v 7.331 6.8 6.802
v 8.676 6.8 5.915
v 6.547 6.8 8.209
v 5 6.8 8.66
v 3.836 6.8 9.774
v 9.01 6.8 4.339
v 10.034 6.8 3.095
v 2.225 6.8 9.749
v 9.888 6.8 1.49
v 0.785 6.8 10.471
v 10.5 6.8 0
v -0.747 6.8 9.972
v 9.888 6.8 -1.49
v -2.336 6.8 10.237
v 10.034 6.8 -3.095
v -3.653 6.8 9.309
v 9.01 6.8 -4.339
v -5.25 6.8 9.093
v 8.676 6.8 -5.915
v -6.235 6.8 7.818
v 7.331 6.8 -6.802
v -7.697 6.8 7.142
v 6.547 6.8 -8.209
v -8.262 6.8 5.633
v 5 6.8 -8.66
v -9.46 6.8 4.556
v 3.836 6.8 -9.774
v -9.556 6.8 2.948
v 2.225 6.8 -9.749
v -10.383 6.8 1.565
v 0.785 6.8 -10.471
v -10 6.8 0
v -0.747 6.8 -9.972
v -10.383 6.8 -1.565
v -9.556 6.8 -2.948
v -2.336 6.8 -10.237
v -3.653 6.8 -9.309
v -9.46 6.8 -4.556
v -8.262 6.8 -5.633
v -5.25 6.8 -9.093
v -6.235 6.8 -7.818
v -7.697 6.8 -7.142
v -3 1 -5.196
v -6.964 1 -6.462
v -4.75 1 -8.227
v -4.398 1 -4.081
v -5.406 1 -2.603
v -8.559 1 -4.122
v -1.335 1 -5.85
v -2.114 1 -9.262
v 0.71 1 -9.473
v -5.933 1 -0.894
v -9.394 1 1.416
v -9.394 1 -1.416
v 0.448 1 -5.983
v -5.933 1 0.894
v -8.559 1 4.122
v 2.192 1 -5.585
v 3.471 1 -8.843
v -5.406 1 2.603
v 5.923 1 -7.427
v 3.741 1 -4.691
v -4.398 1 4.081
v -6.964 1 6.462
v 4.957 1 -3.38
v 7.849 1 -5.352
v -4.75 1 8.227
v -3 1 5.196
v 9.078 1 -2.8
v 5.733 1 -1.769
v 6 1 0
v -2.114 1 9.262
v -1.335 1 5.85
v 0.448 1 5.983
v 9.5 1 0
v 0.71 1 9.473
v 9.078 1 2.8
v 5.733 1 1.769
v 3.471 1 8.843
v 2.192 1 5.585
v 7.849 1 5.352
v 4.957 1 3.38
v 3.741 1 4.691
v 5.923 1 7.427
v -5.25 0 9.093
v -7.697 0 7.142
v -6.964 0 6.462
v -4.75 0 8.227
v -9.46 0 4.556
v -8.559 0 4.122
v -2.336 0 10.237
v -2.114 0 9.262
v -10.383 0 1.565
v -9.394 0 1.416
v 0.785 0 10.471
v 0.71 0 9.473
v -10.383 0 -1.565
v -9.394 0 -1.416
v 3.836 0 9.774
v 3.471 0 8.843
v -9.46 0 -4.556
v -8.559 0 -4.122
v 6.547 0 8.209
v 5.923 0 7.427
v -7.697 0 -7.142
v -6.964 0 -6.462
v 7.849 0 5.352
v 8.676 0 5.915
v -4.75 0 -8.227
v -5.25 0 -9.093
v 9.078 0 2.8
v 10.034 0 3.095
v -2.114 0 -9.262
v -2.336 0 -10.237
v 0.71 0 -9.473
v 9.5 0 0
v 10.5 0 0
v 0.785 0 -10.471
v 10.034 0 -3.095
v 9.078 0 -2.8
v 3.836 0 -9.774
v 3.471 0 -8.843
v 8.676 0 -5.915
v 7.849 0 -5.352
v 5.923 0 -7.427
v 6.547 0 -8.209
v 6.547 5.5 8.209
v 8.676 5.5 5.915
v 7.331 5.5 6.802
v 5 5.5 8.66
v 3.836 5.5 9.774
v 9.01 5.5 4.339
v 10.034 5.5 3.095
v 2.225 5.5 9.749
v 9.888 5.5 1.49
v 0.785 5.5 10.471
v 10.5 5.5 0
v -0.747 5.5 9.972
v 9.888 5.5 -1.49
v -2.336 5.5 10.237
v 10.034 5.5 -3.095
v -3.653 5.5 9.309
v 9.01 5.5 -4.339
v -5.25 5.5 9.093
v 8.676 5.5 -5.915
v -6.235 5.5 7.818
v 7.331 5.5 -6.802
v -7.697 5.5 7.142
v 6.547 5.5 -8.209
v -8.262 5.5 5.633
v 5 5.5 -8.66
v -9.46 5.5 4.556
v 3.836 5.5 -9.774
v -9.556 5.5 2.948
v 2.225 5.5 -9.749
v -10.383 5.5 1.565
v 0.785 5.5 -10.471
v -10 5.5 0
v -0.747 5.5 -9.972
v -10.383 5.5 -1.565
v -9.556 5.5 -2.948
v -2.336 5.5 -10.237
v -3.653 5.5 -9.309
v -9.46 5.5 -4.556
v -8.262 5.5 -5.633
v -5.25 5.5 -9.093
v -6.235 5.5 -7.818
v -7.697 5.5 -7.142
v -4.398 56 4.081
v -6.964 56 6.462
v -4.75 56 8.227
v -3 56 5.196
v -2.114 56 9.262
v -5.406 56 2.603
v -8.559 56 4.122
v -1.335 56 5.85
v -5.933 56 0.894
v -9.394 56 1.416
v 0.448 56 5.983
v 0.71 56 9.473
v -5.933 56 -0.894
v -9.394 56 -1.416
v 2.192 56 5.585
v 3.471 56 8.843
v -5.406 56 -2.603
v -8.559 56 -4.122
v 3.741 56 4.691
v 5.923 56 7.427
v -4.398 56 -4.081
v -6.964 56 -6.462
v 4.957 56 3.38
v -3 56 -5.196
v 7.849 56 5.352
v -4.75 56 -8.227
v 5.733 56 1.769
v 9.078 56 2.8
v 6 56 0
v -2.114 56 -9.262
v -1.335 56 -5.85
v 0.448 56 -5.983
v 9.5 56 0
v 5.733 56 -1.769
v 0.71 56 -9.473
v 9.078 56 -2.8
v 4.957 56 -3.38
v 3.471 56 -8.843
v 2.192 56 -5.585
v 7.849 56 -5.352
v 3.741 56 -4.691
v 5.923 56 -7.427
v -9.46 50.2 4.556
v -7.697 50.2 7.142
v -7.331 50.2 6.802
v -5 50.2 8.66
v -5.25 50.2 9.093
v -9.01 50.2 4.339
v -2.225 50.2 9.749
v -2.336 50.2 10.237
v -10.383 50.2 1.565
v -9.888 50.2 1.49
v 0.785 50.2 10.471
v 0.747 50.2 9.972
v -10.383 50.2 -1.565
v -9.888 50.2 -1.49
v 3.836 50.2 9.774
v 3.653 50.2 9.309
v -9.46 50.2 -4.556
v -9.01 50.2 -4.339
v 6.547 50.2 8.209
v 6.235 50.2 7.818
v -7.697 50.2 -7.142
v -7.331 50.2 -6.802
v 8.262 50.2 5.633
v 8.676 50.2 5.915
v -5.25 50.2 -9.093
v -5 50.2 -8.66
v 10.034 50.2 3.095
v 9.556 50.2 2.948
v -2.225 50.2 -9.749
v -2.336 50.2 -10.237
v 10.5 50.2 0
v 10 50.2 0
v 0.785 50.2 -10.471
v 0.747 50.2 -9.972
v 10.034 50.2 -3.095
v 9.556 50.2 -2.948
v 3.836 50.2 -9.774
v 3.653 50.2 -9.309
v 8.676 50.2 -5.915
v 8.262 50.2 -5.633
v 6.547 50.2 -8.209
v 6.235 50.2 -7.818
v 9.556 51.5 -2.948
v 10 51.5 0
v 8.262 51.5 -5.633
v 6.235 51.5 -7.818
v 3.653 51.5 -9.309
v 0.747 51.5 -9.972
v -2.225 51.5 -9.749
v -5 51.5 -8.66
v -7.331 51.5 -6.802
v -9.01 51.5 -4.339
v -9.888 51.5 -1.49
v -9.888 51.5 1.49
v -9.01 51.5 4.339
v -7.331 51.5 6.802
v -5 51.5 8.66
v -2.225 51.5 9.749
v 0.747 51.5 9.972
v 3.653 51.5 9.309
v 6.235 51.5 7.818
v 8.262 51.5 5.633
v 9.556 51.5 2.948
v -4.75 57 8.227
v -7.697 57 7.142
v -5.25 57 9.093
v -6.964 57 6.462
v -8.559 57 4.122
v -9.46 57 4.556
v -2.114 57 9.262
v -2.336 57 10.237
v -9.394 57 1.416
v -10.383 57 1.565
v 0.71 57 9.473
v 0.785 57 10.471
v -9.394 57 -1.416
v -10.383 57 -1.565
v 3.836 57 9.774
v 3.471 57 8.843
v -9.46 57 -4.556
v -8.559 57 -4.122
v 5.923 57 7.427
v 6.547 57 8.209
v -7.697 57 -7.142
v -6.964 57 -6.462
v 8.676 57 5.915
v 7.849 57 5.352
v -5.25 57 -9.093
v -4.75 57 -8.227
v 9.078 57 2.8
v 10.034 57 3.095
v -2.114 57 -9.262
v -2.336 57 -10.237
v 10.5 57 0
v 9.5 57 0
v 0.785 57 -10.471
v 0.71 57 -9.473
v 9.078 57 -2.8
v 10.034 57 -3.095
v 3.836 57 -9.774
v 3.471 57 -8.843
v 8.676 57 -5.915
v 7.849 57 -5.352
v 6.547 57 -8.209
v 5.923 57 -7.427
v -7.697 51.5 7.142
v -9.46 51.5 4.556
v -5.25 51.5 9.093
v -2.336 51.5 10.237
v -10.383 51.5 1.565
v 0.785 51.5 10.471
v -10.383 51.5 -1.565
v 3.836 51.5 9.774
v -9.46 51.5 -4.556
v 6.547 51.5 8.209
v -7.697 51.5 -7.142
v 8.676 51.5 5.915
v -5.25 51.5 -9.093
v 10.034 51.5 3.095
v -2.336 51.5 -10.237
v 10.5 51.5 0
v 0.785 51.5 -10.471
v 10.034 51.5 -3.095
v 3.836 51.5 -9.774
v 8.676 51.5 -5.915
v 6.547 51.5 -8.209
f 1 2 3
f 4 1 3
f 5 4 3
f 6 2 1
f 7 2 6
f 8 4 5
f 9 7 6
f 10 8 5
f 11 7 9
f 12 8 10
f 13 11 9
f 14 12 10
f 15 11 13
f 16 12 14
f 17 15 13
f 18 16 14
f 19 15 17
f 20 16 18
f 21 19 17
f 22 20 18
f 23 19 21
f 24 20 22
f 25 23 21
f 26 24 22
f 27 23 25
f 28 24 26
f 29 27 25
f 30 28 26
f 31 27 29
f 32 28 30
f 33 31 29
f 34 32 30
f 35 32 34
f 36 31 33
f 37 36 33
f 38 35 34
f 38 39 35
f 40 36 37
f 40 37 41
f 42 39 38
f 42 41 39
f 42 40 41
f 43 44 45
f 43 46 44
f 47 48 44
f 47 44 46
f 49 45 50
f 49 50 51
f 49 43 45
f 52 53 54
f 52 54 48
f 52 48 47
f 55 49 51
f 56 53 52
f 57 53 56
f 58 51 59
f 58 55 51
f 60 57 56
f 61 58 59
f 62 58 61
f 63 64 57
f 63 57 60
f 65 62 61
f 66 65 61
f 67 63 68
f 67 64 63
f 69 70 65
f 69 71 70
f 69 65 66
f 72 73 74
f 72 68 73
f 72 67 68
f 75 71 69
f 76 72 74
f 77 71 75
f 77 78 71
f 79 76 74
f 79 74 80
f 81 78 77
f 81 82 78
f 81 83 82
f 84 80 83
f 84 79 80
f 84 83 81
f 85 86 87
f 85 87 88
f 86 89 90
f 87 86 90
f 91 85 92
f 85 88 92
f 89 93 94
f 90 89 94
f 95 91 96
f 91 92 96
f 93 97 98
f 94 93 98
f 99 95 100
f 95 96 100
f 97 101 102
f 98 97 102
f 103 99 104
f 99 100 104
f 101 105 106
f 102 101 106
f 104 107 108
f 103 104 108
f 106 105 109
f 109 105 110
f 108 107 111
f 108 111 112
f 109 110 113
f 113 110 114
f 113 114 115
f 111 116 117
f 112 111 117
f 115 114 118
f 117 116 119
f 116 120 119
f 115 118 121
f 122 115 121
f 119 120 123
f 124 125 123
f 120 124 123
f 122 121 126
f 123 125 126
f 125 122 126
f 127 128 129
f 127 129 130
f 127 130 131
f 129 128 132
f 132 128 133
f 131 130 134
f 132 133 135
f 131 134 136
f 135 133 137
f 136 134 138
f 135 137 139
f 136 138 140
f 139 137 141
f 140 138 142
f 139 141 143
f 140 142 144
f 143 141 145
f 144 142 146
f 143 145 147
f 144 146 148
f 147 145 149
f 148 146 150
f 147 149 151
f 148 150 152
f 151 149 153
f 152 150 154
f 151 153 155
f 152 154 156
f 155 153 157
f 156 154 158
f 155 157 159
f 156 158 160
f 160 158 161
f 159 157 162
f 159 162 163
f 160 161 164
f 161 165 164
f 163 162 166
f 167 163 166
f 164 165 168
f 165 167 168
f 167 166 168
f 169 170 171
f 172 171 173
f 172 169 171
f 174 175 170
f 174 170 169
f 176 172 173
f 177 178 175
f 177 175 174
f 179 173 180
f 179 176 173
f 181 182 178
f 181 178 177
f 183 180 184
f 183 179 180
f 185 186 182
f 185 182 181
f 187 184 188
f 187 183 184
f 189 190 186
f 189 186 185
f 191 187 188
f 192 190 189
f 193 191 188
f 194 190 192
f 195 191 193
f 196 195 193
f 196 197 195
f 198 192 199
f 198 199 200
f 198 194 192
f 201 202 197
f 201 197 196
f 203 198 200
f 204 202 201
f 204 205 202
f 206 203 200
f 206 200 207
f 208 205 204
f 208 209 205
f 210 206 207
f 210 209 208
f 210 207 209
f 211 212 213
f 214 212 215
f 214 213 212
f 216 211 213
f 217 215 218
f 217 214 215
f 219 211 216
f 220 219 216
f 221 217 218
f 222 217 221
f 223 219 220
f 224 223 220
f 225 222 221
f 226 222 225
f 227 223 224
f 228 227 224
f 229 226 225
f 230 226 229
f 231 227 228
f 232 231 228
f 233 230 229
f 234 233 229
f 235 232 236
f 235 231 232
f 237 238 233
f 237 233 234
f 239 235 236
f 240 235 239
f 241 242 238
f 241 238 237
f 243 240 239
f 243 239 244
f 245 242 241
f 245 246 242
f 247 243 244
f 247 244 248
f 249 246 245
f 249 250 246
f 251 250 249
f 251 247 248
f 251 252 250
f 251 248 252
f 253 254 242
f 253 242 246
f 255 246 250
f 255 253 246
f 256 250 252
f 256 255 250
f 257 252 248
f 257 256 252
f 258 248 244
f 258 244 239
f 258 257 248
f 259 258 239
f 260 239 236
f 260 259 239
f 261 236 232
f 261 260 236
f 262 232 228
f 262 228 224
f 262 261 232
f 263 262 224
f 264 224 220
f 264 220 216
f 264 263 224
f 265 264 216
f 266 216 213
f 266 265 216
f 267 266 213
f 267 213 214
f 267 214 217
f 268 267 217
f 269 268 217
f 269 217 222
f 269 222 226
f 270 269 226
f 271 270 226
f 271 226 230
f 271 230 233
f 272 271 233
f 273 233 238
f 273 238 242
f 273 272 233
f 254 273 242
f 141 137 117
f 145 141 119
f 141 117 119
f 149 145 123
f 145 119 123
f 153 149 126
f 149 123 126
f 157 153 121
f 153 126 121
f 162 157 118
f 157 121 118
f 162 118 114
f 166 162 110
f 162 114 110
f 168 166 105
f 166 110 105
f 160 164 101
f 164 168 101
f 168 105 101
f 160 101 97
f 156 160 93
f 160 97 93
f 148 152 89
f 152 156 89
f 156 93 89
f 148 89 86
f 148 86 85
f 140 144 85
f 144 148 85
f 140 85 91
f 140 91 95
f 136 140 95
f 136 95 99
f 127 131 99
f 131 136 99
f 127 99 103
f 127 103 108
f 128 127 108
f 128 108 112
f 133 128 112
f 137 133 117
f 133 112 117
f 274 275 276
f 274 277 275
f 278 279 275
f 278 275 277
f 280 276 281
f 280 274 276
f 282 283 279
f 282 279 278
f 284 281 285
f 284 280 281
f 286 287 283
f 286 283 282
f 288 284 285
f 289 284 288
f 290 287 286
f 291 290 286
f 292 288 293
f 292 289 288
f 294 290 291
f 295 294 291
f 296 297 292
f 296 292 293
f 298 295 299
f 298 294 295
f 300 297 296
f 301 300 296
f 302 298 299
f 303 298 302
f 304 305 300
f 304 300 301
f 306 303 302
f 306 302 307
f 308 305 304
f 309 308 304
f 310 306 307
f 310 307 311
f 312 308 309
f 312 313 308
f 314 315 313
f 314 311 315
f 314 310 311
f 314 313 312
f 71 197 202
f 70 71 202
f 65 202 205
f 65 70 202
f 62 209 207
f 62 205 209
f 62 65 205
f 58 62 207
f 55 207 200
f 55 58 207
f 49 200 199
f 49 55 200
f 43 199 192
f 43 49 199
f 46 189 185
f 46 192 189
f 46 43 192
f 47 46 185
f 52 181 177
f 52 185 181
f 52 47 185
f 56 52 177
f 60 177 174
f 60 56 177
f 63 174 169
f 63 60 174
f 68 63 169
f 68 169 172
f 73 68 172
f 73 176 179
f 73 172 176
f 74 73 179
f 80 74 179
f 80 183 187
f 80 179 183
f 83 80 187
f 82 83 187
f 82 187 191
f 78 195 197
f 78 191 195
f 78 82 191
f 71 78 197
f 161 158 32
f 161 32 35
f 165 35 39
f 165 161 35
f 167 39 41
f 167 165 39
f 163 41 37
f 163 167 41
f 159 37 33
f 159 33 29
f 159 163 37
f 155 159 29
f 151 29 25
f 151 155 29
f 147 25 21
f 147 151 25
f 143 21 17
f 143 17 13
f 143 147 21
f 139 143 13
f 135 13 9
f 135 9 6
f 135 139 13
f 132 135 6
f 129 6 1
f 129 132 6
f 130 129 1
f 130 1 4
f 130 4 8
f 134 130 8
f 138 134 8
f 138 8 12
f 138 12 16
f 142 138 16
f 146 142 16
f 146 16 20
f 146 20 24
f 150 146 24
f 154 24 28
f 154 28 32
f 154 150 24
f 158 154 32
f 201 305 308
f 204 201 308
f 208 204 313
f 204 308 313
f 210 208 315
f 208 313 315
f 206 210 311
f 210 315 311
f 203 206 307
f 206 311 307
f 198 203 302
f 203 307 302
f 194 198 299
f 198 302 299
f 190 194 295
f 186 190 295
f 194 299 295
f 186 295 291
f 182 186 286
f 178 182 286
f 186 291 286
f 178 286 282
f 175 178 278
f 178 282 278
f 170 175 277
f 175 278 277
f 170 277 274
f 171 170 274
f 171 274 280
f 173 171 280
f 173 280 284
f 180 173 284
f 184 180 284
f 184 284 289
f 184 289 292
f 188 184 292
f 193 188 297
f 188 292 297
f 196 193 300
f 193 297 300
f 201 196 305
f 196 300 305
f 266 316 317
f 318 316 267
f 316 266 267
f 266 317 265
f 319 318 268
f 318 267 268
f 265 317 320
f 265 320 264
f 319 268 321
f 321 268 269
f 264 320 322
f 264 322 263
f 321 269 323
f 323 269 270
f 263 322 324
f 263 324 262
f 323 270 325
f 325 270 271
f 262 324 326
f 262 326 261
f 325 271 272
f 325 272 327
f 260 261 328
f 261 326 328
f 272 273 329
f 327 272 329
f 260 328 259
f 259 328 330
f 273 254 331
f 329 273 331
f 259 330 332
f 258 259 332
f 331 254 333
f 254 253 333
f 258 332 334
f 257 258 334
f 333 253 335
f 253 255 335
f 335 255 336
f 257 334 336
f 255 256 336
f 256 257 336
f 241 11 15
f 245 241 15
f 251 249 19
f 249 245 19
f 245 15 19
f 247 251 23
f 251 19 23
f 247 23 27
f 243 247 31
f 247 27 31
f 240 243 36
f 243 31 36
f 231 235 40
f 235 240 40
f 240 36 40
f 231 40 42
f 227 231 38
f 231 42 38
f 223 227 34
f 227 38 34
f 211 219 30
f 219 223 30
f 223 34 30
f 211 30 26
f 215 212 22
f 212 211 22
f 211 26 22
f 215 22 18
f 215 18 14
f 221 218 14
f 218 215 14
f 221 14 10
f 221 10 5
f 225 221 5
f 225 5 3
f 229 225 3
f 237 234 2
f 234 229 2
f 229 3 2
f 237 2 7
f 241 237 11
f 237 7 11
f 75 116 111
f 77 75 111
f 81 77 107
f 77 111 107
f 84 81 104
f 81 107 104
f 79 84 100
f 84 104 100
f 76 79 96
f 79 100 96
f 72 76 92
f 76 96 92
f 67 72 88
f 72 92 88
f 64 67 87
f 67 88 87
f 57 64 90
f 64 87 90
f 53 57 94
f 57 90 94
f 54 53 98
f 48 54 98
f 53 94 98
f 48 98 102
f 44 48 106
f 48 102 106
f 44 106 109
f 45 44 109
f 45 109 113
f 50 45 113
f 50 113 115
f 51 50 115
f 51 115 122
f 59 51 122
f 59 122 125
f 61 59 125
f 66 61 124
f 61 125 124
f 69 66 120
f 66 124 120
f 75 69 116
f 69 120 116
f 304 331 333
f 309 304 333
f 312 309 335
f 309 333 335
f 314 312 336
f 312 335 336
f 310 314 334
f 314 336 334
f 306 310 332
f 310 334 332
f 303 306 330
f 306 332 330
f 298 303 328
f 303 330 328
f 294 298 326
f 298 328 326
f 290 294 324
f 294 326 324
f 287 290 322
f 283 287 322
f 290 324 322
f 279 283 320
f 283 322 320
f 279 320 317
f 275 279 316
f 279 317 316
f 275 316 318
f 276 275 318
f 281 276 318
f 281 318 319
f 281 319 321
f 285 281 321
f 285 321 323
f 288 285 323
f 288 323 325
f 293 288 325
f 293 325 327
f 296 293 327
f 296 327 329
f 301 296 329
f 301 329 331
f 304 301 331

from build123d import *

# Parameters (mm, degrees)
SKETCH1_R         = 10.5
SKETCH1_R_2       = 6
EXTRUDE1_DEPTH    = 57
SKETCH2_R         = 9.5
EXTRUDE2_DEPTH    = 1
SKETCH3_R         = 9.5
EXTRUDE3_DEPTH    = 1
SKETCH4_OUTSIDE_W = 35.854
SKETCH4_OUTSIDE_H = 35.854
SKETCH4_OUTSIDE_R = 10
EXTRUDE4_DEPTH    = 1.3
SKETCH5_OUTSIDE_W = 35.854
SKETCH5_OUTSIDE_H = 35.854
SKETCH5_OUTSIDE_R = 10
EXTRUDE5_DEPTH    = 1.3


with BuildPart() as part:
    # Sketch1 → Extrude1 (new body)
    with BuildSketch(Plane(origin=(0, 0, 0), x_dir=(1, 0, 0), z_dir=(0, 1, 0))):
        Circle(SKETCH1_R)
        Circle(SKETCH1_R_2, mode=Mode.SUBTRACT)
    extrude(amount=EXTRUDE1_DEPTH)

    # Sketch2 → Extrude2 (cut)
    with BuildSketch(Plane(origin=(0, 57, 0), x_dir=(1, 0, 0), z_dir=(0, 1, 0))):
        Circle(SKETCH2_R)
    extrude(amount=-EXTRUDE2_DEPTH, mode=Mode.SUBTRACT)

    # Sketch3 → Extrude3 (cut)
    with BuildSketch(Plane.XZ):
        Circle(SKETCH3_R)
    extrude(amount=-EXTRUDE3_DEPTH, mode=Mode.SUBTRACT)

    # Sketch4 outside → Extrude4 (cut)
    with BuildSketch(Plane(origin=(0, 51.5, 0), x_dir=(1, 0, 0), z_dir=(0, 1, 0))):
        Rectangle(SKETCH4_OUTSIDE_W, SKETCH4_OUTSIDE_H)
        Circle(SKETCH4_OUTSIDE_R, mode=Mode.SUBTRACT)
    extrude(amount=-EXTRUDE4_DEPTH, mode=Mode.SUBTRACT)

    # Sketch5 outside → Extrude5 (cut)
    with BuildSketch(Plane(origin=(0, 5.5, 0), x_dir=(-1, 0, 0), z_dir=(0, -1, 0))):
        Rectangle(SKETCH5_OUTSIDE_W, SKETCH5_OUTSIDE_H)
        Circle(SKETCH5_OUTSIDE_R, mode=Mode.SUBTRACT)
    extrude(amount=-EXTRUDE5_DEPTH, mode=Mode.SUBTRACT)


solid = part.part
